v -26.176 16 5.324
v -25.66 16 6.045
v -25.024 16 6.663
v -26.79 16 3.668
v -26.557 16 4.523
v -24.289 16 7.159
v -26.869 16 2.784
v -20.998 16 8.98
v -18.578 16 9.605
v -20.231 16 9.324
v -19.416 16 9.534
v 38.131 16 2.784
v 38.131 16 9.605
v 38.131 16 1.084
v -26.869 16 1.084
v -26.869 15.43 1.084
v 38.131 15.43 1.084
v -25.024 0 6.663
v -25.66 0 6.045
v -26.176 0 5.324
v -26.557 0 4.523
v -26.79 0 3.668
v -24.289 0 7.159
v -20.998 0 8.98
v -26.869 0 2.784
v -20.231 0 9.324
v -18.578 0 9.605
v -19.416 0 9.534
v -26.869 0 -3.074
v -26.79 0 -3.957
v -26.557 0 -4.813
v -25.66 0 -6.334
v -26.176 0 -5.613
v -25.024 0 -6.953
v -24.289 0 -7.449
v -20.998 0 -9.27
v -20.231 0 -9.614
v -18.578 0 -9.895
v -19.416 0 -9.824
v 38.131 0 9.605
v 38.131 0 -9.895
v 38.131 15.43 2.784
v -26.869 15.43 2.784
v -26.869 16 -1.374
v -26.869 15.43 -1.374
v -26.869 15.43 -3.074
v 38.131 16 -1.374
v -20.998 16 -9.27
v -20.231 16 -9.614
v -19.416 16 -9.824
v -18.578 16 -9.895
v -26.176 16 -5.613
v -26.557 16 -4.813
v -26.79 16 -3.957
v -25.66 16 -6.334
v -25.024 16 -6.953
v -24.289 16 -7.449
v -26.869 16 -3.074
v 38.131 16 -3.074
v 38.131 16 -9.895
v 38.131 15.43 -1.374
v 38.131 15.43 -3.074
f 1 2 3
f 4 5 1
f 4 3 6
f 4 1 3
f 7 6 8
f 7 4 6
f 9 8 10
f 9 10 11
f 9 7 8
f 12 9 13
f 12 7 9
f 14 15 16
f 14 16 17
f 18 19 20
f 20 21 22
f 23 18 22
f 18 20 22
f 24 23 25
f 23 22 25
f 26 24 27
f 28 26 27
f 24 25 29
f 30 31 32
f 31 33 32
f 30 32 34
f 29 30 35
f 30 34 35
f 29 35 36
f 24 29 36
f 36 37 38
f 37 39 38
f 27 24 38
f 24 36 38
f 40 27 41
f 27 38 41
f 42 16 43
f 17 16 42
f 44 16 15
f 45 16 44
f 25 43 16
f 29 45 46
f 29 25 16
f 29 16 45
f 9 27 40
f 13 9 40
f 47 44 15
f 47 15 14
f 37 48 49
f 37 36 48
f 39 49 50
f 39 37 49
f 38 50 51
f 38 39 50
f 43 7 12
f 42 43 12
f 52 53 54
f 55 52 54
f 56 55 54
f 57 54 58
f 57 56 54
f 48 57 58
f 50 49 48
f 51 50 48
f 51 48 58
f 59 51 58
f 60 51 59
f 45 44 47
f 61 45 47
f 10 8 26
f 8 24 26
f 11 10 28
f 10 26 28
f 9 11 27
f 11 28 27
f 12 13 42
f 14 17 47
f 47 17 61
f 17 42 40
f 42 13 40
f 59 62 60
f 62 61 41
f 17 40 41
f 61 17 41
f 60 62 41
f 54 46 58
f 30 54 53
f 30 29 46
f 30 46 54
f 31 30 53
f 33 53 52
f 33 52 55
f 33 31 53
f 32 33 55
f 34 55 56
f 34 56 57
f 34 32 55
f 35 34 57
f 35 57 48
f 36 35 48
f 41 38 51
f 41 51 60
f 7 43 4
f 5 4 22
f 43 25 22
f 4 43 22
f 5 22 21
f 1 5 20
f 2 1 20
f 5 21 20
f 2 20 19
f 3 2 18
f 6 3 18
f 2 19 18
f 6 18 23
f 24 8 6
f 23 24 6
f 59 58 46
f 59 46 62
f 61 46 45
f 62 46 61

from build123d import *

# Parameters (mm, degrees)
CROQUIS1_W              = 65
CROQUIS1_H              = 19.5
SALIENTE_EXTRUIR1_DEPTH = 16
CORTAR_EXTRUIR1_DEPTH   = 16
REDONDEO1_R             = 5
CROQUIS4_W              = 65
CROQUIS4_H              = 1.7
CORTAR_EXTRUIR2_DEPTH   = 0.57


with BuildPart() as part:
    # Croquis1 → Saliente-Extruir1 (new body)
    with BuildSketch(Plane(origin=(0, 0, 0), x_dir=(1, 0, 0), z_dir=(0, 1, 0))):
        with Locations((5.631188119, 0.14480198)):
            Rectangle(CROQUIS1_W, CROQUIS1_H)
    extrude(amount=SALIENTE_EXTRUIR1_DEPTH)

    # Croquis2 → Cortar-Extruir1 (cut)
    with BuildSketch(Plane(origin=(0, 16, 0), x_dir=(1, 0, 0), z_dir=(0, 1, 0))):
        Polygon((-26.868811881, 6.021818634), (-19.868811881, 9.89480198), (-26.868811881, 9.89480198), align=None)
        Polygon((-26.868811881, -9.60519802), (-19.868811881, -9.60519802), (-26.868811881, -5.732214674), align=None)
    extrude(amount=-CORTAR_EXTRUIR1_DEPTH, mode=Mode.SUBTRACT)

    # Redondeo1
    redondeo1_edges = [part.edges().sort_by_distance(p)[0] for p in [
        (-19.868811881, 8, -9.89480198),
        (-26.868811881, 8, -6.021818634),
        (-26.868811881, 8, 5.732214674),
        (-19.868811881, 8, 9.60519802),
    ]]
    fillet(redondeo1_edges, radius=REDONDEO1_R)

    # Croquis4 → Cortar-Extruir2 (cut)
    with BuildSketch(Plane(origin=(0, 16, 0), x_dir=(1, 0, 0), z_dir=(0, 1, 0))):
        with Locations((5.631188119, 2.223949596)):
            Rectangle(CROQUIS4_W, CROQUIS4_H)
        with Locations((5.631188119, -1.934345635)):
            Rectangle(CROQUIS4_W, CROQUIS4_H)
    extrude(amount=-CORTAR_EXTRUIR2_DEPTH, mode=Mode.SUBTRACT)


solid = part.part
